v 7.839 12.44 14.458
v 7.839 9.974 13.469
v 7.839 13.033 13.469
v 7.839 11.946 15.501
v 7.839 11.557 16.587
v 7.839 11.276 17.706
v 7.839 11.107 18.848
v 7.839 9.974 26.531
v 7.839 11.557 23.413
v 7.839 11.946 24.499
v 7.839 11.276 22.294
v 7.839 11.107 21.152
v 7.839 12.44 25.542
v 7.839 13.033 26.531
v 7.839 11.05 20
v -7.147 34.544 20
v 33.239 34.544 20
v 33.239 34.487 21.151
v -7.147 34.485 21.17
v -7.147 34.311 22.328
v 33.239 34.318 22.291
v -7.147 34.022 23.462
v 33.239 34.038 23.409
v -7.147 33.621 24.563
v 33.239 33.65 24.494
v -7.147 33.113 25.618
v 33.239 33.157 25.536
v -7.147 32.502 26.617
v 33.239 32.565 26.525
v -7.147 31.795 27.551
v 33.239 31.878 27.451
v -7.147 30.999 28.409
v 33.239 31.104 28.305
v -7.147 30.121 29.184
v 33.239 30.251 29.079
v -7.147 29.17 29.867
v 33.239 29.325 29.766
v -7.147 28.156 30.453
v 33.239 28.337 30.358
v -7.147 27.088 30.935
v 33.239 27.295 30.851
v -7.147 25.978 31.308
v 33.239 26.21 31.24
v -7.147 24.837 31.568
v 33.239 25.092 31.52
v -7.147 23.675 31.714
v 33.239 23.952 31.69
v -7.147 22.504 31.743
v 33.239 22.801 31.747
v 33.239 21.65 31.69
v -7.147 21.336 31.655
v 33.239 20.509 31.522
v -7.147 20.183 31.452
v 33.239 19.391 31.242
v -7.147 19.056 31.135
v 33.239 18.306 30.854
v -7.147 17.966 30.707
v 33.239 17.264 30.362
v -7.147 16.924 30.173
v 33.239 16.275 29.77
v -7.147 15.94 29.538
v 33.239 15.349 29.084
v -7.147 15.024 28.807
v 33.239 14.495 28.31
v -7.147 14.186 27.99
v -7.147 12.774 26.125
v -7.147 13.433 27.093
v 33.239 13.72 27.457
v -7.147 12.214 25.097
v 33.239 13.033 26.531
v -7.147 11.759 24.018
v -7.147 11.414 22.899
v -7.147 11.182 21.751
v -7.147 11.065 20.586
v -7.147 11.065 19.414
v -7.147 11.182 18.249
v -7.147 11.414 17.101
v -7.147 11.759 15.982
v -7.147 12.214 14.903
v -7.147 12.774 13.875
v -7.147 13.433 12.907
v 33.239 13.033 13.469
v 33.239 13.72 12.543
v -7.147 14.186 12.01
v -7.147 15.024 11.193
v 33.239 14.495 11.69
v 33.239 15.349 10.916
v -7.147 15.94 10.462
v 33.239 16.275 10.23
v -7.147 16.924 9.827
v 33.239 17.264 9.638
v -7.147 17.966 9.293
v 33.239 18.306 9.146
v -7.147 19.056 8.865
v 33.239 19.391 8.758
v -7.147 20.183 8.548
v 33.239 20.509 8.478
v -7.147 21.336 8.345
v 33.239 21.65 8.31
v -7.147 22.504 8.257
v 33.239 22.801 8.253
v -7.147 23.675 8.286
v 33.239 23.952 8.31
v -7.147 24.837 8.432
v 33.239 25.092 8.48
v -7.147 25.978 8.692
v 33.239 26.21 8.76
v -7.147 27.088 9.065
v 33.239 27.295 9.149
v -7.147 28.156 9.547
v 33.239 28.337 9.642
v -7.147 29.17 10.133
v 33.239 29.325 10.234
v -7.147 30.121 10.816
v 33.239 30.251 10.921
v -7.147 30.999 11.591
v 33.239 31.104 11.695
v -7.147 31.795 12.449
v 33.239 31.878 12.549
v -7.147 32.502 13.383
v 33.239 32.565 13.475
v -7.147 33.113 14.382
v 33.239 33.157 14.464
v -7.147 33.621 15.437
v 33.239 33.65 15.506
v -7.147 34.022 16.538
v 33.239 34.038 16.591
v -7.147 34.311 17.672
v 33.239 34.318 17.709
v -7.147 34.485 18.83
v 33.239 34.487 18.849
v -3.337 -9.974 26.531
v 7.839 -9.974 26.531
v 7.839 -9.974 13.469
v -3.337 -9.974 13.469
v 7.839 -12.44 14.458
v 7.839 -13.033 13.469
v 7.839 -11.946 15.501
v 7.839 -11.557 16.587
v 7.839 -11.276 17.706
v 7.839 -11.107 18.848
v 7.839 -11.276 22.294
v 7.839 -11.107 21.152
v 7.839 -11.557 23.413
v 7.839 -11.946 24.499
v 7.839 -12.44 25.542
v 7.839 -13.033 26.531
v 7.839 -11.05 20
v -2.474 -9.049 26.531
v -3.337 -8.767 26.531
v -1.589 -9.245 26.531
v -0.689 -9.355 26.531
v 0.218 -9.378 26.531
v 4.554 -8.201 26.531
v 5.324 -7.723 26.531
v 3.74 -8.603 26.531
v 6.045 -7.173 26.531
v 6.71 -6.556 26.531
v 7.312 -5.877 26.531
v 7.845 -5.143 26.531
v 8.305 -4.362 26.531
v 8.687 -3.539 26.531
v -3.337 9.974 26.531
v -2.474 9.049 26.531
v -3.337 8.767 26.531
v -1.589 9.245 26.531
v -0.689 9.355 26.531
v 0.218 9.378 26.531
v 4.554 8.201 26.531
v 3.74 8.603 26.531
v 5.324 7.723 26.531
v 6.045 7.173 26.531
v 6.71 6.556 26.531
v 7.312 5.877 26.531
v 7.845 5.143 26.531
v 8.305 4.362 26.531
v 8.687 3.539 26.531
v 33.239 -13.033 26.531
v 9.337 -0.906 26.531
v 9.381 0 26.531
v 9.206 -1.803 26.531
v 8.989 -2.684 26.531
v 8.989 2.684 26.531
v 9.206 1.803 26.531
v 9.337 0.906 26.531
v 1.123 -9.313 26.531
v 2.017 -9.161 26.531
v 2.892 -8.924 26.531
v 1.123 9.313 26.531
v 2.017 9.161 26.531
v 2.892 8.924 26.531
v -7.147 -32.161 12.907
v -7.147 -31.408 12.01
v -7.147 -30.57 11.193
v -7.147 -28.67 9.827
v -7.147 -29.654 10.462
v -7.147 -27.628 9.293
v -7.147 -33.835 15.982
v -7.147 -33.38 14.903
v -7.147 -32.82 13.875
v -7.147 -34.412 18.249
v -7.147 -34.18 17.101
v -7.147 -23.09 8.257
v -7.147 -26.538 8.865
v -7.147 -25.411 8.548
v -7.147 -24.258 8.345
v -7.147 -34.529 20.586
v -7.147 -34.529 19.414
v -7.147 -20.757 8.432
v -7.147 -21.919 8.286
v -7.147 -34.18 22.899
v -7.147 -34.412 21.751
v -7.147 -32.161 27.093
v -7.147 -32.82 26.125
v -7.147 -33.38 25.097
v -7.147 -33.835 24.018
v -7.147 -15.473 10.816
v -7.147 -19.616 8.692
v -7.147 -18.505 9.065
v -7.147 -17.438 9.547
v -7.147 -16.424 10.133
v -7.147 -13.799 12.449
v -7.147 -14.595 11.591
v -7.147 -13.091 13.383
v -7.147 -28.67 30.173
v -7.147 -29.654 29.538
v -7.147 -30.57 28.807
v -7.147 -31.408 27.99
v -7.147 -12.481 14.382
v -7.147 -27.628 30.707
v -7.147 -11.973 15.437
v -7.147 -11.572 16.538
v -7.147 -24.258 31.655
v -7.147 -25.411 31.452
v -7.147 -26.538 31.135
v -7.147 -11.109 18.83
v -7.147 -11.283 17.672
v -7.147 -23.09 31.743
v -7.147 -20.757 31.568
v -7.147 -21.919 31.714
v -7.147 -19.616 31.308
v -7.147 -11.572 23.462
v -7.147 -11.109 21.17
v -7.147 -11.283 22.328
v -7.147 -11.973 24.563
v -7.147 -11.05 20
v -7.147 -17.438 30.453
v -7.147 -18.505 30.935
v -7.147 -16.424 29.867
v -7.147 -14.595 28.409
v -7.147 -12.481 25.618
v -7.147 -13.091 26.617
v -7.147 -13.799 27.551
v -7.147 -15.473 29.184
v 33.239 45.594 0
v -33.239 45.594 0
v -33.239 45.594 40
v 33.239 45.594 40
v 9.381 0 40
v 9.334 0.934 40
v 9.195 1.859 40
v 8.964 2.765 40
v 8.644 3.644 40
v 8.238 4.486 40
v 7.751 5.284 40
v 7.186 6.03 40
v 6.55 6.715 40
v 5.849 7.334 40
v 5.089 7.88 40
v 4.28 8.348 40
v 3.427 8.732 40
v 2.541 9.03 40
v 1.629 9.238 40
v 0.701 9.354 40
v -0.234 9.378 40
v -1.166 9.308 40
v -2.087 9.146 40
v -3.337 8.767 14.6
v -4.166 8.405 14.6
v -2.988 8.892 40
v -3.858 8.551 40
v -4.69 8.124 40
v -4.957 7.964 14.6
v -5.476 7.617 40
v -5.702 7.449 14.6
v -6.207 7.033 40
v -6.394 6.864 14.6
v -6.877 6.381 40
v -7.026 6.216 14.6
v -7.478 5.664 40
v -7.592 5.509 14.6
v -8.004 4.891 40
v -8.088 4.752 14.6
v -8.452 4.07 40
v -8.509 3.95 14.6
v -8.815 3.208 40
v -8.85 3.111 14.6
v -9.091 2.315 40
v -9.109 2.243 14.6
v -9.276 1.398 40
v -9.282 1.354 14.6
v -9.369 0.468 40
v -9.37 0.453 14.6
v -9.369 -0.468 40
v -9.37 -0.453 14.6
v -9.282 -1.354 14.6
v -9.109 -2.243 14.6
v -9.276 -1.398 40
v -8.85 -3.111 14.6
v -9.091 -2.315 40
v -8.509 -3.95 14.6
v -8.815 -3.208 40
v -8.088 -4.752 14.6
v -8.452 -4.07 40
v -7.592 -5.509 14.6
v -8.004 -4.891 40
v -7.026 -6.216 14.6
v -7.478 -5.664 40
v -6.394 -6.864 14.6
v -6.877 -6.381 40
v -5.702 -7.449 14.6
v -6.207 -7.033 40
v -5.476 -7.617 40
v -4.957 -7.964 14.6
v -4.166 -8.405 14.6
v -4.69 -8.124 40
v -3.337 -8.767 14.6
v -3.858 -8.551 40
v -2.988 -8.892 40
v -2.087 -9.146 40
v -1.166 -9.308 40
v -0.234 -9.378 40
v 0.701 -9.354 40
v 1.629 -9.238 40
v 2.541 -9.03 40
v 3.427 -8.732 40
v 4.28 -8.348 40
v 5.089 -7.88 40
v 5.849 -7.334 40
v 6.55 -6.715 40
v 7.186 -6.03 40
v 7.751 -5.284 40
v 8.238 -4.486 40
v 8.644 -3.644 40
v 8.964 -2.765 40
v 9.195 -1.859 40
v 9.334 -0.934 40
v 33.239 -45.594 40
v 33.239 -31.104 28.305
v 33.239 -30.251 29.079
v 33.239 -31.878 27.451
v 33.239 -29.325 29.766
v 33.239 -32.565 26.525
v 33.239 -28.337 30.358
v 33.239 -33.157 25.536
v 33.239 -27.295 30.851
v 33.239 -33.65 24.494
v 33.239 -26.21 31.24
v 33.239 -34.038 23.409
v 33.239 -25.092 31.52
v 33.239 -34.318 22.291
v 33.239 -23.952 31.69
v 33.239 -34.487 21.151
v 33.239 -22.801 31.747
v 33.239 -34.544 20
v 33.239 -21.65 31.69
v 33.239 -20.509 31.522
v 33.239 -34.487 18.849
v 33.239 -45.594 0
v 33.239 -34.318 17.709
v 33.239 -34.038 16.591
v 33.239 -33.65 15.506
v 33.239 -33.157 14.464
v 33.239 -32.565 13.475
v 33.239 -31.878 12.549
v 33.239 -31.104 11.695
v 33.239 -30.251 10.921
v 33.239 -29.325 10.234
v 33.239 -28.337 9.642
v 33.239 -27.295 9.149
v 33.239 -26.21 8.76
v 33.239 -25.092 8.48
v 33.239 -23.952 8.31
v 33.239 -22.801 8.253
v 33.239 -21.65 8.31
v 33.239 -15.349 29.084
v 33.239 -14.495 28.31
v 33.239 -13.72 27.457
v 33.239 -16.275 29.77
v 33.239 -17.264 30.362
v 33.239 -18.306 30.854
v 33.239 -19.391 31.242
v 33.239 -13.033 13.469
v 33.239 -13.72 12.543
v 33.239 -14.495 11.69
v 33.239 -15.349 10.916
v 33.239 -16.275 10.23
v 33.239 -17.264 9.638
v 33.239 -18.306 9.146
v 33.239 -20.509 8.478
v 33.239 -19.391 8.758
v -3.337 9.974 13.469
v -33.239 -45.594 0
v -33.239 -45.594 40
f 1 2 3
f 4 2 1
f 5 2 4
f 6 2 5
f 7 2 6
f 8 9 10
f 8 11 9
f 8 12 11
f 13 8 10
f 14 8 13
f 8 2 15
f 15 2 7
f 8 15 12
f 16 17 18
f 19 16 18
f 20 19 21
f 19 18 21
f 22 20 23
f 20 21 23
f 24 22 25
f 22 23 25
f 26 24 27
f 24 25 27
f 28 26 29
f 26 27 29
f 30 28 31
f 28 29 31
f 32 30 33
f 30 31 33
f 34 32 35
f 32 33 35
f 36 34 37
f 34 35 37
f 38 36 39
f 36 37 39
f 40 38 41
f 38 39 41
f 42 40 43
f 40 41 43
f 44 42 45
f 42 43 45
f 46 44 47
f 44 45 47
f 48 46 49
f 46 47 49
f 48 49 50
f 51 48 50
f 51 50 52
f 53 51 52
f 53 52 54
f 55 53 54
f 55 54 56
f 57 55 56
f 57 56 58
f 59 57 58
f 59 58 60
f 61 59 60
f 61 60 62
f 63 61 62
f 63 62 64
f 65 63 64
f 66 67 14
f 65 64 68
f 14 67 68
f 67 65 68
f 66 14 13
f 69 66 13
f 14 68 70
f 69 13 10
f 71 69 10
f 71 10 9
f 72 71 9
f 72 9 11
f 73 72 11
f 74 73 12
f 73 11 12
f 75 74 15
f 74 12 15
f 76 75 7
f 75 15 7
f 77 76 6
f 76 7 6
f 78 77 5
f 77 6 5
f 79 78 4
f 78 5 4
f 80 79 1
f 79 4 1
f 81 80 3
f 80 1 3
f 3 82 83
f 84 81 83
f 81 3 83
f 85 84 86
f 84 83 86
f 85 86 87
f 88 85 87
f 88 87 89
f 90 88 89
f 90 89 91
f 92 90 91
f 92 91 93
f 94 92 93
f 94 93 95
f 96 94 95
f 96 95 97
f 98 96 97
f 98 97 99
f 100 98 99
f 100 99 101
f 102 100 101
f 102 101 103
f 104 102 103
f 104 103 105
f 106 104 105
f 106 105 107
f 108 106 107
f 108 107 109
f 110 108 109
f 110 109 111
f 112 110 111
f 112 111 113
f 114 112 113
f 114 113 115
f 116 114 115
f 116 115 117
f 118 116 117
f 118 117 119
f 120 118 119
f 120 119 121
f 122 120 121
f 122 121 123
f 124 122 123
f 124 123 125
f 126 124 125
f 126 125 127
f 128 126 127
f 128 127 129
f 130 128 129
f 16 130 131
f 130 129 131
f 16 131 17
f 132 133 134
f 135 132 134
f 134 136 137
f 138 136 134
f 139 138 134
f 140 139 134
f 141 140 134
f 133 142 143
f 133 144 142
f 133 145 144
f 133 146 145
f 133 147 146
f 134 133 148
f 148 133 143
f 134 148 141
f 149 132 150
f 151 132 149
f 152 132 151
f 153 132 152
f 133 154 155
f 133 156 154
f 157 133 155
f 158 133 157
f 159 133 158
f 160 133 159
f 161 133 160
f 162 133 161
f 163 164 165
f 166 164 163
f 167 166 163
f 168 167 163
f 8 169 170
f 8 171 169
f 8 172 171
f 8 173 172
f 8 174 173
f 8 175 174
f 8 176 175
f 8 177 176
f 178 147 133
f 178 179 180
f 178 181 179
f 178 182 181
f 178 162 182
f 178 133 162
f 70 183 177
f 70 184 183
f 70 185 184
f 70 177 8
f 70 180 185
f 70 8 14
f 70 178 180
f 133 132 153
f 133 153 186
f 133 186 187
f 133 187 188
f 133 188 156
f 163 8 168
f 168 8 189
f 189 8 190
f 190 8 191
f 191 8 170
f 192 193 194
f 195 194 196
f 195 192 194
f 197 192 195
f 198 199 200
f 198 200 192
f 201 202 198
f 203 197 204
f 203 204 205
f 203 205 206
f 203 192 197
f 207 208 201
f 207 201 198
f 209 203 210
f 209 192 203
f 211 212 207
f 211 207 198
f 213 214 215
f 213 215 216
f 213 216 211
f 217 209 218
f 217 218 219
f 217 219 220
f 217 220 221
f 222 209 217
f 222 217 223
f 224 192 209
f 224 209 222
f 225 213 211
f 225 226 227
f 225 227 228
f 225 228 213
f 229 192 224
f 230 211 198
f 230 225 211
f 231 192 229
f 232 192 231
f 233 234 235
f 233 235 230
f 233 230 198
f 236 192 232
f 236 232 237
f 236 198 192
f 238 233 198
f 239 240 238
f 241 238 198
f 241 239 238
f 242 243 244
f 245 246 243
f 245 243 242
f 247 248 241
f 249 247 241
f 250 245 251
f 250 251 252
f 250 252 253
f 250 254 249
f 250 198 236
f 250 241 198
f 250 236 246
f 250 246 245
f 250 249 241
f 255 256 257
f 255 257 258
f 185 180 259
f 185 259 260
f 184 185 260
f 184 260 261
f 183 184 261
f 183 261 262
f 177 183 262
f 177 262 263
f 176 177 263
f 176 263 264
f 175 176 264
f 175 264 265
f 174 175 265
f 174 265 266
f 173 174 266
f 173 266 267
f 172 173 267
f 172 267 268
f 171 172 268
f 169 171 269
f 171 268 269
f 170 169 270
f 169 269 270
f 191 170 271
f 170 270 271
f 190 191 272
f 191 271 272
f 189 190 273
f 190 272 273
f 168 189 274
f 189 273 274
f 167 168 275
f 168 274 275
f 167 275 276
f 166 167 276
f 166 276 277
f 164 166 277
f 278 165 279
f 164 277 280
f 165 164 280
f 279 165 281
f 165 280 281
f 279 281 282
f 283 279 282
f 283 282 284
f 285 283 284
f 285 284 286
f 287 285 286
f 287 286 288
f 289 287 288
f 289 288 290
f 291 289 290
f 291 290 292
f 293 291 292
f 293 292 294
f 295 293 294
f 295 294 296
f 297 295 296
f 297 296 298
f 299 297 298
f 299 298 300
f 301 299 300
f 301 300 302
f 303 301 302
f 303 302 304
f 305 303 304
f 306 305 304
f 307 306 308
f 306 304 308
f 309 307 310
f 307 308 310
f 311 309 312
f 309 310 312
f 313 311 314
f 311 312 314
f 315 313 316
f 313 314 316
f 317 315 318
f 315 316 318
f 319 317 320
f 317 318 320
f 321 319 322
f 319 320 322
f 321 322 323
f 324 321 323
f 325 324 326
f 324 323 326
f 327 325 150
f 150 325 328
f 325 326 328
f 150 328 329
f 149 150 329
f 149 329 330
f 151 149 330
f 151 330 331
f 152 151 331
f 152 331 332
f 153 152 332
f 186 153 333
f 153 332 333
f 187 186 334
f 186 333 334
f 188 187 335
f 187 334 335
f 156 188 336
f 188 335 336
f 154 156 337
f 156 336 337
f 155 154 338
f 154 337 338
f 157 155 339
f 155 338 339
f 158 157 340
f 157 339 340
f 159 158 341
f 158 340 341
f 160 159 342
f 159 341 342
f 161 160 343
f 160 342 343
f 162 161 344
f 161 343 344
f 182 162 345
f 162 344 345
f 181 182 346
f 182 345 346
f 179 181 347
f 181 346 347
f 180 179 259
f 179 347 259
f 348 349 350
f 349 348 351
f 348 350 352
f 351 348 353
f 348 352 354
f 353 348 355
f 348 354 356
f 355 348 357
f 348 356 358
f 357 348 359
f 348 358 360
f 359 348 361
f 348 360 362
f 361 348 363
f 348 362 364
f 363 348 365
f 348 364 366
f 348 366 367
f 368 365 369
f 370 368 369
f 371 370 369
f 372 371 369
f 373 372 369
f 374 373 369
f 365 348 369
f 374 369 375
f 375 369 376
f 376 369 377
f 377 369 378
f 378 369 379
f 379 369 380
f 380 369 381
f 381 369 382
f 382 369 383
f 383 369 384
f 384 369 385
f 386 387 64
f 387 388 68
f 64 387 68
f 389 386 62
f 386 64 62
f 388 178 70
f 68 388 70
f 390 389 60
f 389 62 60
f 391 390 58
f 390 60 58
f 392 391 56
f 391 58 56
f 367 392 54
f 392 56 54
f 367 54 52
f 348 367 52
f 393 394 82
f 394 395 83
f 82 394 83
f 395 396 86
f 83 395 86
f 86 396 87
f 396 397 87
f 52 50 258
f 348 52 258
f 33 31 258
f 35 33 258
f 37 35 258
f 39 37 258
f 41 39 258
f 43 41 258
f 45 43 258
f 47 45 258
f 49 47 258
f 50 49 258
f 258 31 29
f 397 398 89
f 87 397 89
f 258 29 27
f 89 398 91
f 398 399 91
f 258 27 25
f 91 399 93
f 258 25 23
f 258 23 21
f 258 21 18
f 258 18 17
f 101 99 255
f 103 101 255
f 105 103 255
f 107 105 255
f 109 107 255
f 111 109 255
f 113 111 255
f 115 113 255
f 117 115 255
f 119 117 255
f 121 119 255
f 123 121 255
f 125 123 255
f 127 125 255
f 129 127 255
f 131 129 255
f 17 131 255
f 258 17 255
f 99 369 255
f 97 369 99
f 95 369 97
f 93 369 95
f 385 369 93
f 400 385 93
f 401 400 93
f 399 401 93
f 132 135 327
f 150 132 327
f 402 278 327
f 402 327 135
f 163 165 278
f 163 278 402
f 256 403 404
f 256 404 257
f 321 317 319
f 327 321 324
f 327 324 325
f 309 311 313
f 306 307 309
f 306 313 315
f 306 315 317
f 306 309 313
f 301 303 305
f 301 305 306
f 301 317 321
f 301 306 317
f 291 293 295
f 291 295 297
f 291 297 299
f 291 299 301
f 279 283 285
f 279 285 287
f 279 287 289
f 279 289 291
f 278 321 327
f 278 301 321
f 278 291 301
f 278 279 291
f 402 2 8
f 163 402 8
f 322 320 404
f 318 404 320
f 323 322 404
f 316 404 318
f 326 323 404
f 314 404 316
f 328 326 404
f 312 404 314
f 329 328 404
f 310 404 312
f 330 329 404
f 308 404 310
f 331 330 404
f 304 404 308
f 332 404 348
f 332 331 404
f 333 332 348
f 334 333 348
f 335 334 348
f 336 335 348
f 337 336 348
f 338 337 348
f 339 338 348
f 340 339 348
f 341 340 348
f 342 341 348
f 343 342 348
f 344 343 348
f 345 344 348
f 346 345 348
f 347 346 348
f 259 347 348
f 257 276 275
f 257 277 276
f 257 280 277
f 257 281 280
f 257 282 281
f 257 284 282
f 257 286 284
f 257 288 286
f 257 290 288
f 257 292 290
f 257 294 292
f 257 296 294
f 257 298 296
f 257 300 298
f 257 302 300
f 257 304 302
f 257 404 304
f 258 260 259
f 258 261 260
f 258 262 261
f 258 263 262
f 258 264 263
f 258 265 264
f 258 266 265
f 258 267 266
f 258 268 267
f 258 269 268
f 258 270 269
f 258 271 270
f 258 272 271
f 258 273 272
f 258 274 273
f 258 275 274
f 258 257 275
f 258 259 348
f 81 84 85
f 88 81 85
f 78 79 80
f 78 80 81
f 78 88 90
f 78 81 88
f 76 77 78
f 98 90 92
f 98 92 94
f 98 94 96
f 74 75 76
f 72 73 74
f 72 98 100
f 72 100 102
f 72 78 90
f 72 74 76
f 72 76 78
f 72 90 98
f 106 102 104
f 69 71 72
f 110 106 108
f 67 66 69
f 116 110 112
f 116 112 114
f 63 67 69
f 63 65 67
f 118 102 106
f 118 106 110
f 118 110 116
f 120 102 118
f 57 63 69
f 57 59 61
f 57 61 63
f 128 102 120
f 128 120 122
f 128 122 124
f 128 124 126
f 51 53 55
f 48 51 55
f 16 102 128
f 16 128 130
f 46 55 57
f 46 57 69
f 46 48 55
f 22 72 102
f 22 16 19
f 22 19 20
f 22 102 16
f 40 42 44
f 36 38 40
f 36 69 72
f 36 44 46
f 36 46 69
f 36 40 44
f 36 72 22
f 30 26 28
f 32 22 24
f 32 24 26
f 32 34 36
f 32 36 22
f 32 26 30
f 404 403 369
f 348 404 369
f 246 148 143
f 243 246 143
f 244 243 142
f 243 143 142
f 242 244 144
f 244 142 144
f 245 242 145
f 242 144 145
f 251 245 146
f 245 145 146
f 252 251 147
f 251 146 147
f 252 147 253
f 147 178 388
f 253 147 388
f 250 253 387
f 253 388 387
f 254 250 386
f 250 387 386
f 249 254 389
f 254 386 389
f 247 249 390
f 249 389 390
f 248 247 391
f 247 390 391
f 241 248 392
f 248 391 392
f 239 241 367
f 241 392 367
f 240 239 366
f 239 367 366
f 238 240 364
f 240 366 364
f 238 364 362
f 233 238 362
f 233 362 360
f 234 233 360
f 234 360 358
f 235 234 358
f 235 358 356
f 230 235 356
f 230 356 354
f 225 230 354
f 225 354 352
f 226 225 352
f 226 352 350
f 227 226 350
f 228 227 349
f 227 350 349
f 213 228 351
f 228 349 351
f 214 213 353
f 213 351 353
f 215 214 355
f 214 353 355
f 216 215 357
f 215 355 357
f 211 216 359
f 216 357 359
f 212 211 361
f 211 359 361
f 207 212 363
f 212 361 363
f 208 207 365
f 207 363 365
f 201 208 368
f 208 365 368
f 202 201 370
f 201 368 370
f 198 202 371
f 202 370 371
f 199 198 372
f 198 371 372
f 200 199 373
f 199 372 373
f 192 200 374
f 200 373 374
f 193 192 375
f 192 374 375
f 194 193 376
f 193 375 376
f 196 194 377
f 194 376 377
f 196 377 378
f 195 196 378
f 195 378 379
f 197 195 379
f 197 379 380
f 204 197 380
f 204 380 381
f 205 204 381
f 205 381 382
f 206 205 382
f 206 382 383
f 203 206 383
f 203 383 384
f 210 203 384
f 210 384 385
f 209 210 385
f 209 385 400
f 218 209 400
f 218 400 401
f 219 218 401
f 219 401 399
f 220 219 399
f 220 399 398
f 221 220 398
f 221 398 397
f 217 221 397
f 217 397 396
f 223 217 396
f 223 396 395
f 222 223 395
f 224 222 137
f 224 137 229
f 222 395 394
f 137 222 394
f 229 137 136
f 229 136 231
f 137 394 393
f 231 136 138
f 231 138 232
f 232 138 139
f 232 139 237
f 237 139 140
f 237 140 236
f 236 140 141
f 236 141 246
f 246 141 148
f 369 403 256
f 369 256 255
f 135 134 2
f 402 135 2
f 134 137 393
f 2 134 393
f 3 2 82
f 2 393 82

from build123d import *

# Parameters (mm, degrees)
F0_W     = 66.478894
F0_H     = 91.187872
F1_DEPTH = 40
F2_R     = 11.746633
F2_R_2   = 11.746636
F3_DEPTH = 40.386
F4_R     = 9.380712
F5_DEPTH = 25.4
F6_W     = 26.066788
F6_H     = 13.062328
F7_DEPTH = 25.4
F9_DEPTH = 36.576


with BuildPart() as f1:
    # F0 (on Top) → F1 (new body)
    with BuildSketch(Plane.XY):
        Rectangle(F0_W, F0_H)
    extrude(amount=F1_DEPTH)

    # F2 (on face) → F3 (cut)
    with BuildSketch(Plane.YZ.offset(33.239447)):
        with Locations((-22.796968, 20)):
            Circle(F2_R)
        with Locations((22.796968, 20)):
            Circle(F2_R_2)
    extrude(amount=-F3_DEPTH, mode=Mode.SUBTRACT)

    # F4 (on face) → F5 (cut)
    with BuildSketch(Plane.XY.offset(40)):
        Circle(F4_R)
    extrude(amount=-F5_DEPTH, mode=Mode.SUBTRACT)

    # F6 (on face) → F7 (cut)
    with BuildSketch(Plane.YZ.offset(33.239447)):
        with Locations((0, 20)):
            Rectangle(F6_W, F6_H)
    extrude(amount=-F7_DEPTH, mode=Mode.SUBTRACT)

    # F8 (on face) → F9 (cut)
    with BuildSketch(Plane.YZ.offset(33.239447)):
        Polygon((-9.974017, 26.531164), (-9.974017, 24.998077), (-2e-06, 20), (9.974013, 24.998077), (9.974013, 26.531164), align=None)
        Polygon((-2e-06, 20), (-9.974017, 24.998077), (-9.974017, 15.001923), align=None)
        Polygon((9.974013, 24.998077), (-2e-06, 20), (9.974013, 15.001923), align=None)
        Polygon((9.974013, 15.001923), (-2e-06, 20), (-9.974017, 15.001923), (-9.974017, 13.468836), (9.974013, 13.468836), align=None)
    extrude(amount=-F9_DEPTH, mode=Mode.SUBTRACT)


solid = f1.part
